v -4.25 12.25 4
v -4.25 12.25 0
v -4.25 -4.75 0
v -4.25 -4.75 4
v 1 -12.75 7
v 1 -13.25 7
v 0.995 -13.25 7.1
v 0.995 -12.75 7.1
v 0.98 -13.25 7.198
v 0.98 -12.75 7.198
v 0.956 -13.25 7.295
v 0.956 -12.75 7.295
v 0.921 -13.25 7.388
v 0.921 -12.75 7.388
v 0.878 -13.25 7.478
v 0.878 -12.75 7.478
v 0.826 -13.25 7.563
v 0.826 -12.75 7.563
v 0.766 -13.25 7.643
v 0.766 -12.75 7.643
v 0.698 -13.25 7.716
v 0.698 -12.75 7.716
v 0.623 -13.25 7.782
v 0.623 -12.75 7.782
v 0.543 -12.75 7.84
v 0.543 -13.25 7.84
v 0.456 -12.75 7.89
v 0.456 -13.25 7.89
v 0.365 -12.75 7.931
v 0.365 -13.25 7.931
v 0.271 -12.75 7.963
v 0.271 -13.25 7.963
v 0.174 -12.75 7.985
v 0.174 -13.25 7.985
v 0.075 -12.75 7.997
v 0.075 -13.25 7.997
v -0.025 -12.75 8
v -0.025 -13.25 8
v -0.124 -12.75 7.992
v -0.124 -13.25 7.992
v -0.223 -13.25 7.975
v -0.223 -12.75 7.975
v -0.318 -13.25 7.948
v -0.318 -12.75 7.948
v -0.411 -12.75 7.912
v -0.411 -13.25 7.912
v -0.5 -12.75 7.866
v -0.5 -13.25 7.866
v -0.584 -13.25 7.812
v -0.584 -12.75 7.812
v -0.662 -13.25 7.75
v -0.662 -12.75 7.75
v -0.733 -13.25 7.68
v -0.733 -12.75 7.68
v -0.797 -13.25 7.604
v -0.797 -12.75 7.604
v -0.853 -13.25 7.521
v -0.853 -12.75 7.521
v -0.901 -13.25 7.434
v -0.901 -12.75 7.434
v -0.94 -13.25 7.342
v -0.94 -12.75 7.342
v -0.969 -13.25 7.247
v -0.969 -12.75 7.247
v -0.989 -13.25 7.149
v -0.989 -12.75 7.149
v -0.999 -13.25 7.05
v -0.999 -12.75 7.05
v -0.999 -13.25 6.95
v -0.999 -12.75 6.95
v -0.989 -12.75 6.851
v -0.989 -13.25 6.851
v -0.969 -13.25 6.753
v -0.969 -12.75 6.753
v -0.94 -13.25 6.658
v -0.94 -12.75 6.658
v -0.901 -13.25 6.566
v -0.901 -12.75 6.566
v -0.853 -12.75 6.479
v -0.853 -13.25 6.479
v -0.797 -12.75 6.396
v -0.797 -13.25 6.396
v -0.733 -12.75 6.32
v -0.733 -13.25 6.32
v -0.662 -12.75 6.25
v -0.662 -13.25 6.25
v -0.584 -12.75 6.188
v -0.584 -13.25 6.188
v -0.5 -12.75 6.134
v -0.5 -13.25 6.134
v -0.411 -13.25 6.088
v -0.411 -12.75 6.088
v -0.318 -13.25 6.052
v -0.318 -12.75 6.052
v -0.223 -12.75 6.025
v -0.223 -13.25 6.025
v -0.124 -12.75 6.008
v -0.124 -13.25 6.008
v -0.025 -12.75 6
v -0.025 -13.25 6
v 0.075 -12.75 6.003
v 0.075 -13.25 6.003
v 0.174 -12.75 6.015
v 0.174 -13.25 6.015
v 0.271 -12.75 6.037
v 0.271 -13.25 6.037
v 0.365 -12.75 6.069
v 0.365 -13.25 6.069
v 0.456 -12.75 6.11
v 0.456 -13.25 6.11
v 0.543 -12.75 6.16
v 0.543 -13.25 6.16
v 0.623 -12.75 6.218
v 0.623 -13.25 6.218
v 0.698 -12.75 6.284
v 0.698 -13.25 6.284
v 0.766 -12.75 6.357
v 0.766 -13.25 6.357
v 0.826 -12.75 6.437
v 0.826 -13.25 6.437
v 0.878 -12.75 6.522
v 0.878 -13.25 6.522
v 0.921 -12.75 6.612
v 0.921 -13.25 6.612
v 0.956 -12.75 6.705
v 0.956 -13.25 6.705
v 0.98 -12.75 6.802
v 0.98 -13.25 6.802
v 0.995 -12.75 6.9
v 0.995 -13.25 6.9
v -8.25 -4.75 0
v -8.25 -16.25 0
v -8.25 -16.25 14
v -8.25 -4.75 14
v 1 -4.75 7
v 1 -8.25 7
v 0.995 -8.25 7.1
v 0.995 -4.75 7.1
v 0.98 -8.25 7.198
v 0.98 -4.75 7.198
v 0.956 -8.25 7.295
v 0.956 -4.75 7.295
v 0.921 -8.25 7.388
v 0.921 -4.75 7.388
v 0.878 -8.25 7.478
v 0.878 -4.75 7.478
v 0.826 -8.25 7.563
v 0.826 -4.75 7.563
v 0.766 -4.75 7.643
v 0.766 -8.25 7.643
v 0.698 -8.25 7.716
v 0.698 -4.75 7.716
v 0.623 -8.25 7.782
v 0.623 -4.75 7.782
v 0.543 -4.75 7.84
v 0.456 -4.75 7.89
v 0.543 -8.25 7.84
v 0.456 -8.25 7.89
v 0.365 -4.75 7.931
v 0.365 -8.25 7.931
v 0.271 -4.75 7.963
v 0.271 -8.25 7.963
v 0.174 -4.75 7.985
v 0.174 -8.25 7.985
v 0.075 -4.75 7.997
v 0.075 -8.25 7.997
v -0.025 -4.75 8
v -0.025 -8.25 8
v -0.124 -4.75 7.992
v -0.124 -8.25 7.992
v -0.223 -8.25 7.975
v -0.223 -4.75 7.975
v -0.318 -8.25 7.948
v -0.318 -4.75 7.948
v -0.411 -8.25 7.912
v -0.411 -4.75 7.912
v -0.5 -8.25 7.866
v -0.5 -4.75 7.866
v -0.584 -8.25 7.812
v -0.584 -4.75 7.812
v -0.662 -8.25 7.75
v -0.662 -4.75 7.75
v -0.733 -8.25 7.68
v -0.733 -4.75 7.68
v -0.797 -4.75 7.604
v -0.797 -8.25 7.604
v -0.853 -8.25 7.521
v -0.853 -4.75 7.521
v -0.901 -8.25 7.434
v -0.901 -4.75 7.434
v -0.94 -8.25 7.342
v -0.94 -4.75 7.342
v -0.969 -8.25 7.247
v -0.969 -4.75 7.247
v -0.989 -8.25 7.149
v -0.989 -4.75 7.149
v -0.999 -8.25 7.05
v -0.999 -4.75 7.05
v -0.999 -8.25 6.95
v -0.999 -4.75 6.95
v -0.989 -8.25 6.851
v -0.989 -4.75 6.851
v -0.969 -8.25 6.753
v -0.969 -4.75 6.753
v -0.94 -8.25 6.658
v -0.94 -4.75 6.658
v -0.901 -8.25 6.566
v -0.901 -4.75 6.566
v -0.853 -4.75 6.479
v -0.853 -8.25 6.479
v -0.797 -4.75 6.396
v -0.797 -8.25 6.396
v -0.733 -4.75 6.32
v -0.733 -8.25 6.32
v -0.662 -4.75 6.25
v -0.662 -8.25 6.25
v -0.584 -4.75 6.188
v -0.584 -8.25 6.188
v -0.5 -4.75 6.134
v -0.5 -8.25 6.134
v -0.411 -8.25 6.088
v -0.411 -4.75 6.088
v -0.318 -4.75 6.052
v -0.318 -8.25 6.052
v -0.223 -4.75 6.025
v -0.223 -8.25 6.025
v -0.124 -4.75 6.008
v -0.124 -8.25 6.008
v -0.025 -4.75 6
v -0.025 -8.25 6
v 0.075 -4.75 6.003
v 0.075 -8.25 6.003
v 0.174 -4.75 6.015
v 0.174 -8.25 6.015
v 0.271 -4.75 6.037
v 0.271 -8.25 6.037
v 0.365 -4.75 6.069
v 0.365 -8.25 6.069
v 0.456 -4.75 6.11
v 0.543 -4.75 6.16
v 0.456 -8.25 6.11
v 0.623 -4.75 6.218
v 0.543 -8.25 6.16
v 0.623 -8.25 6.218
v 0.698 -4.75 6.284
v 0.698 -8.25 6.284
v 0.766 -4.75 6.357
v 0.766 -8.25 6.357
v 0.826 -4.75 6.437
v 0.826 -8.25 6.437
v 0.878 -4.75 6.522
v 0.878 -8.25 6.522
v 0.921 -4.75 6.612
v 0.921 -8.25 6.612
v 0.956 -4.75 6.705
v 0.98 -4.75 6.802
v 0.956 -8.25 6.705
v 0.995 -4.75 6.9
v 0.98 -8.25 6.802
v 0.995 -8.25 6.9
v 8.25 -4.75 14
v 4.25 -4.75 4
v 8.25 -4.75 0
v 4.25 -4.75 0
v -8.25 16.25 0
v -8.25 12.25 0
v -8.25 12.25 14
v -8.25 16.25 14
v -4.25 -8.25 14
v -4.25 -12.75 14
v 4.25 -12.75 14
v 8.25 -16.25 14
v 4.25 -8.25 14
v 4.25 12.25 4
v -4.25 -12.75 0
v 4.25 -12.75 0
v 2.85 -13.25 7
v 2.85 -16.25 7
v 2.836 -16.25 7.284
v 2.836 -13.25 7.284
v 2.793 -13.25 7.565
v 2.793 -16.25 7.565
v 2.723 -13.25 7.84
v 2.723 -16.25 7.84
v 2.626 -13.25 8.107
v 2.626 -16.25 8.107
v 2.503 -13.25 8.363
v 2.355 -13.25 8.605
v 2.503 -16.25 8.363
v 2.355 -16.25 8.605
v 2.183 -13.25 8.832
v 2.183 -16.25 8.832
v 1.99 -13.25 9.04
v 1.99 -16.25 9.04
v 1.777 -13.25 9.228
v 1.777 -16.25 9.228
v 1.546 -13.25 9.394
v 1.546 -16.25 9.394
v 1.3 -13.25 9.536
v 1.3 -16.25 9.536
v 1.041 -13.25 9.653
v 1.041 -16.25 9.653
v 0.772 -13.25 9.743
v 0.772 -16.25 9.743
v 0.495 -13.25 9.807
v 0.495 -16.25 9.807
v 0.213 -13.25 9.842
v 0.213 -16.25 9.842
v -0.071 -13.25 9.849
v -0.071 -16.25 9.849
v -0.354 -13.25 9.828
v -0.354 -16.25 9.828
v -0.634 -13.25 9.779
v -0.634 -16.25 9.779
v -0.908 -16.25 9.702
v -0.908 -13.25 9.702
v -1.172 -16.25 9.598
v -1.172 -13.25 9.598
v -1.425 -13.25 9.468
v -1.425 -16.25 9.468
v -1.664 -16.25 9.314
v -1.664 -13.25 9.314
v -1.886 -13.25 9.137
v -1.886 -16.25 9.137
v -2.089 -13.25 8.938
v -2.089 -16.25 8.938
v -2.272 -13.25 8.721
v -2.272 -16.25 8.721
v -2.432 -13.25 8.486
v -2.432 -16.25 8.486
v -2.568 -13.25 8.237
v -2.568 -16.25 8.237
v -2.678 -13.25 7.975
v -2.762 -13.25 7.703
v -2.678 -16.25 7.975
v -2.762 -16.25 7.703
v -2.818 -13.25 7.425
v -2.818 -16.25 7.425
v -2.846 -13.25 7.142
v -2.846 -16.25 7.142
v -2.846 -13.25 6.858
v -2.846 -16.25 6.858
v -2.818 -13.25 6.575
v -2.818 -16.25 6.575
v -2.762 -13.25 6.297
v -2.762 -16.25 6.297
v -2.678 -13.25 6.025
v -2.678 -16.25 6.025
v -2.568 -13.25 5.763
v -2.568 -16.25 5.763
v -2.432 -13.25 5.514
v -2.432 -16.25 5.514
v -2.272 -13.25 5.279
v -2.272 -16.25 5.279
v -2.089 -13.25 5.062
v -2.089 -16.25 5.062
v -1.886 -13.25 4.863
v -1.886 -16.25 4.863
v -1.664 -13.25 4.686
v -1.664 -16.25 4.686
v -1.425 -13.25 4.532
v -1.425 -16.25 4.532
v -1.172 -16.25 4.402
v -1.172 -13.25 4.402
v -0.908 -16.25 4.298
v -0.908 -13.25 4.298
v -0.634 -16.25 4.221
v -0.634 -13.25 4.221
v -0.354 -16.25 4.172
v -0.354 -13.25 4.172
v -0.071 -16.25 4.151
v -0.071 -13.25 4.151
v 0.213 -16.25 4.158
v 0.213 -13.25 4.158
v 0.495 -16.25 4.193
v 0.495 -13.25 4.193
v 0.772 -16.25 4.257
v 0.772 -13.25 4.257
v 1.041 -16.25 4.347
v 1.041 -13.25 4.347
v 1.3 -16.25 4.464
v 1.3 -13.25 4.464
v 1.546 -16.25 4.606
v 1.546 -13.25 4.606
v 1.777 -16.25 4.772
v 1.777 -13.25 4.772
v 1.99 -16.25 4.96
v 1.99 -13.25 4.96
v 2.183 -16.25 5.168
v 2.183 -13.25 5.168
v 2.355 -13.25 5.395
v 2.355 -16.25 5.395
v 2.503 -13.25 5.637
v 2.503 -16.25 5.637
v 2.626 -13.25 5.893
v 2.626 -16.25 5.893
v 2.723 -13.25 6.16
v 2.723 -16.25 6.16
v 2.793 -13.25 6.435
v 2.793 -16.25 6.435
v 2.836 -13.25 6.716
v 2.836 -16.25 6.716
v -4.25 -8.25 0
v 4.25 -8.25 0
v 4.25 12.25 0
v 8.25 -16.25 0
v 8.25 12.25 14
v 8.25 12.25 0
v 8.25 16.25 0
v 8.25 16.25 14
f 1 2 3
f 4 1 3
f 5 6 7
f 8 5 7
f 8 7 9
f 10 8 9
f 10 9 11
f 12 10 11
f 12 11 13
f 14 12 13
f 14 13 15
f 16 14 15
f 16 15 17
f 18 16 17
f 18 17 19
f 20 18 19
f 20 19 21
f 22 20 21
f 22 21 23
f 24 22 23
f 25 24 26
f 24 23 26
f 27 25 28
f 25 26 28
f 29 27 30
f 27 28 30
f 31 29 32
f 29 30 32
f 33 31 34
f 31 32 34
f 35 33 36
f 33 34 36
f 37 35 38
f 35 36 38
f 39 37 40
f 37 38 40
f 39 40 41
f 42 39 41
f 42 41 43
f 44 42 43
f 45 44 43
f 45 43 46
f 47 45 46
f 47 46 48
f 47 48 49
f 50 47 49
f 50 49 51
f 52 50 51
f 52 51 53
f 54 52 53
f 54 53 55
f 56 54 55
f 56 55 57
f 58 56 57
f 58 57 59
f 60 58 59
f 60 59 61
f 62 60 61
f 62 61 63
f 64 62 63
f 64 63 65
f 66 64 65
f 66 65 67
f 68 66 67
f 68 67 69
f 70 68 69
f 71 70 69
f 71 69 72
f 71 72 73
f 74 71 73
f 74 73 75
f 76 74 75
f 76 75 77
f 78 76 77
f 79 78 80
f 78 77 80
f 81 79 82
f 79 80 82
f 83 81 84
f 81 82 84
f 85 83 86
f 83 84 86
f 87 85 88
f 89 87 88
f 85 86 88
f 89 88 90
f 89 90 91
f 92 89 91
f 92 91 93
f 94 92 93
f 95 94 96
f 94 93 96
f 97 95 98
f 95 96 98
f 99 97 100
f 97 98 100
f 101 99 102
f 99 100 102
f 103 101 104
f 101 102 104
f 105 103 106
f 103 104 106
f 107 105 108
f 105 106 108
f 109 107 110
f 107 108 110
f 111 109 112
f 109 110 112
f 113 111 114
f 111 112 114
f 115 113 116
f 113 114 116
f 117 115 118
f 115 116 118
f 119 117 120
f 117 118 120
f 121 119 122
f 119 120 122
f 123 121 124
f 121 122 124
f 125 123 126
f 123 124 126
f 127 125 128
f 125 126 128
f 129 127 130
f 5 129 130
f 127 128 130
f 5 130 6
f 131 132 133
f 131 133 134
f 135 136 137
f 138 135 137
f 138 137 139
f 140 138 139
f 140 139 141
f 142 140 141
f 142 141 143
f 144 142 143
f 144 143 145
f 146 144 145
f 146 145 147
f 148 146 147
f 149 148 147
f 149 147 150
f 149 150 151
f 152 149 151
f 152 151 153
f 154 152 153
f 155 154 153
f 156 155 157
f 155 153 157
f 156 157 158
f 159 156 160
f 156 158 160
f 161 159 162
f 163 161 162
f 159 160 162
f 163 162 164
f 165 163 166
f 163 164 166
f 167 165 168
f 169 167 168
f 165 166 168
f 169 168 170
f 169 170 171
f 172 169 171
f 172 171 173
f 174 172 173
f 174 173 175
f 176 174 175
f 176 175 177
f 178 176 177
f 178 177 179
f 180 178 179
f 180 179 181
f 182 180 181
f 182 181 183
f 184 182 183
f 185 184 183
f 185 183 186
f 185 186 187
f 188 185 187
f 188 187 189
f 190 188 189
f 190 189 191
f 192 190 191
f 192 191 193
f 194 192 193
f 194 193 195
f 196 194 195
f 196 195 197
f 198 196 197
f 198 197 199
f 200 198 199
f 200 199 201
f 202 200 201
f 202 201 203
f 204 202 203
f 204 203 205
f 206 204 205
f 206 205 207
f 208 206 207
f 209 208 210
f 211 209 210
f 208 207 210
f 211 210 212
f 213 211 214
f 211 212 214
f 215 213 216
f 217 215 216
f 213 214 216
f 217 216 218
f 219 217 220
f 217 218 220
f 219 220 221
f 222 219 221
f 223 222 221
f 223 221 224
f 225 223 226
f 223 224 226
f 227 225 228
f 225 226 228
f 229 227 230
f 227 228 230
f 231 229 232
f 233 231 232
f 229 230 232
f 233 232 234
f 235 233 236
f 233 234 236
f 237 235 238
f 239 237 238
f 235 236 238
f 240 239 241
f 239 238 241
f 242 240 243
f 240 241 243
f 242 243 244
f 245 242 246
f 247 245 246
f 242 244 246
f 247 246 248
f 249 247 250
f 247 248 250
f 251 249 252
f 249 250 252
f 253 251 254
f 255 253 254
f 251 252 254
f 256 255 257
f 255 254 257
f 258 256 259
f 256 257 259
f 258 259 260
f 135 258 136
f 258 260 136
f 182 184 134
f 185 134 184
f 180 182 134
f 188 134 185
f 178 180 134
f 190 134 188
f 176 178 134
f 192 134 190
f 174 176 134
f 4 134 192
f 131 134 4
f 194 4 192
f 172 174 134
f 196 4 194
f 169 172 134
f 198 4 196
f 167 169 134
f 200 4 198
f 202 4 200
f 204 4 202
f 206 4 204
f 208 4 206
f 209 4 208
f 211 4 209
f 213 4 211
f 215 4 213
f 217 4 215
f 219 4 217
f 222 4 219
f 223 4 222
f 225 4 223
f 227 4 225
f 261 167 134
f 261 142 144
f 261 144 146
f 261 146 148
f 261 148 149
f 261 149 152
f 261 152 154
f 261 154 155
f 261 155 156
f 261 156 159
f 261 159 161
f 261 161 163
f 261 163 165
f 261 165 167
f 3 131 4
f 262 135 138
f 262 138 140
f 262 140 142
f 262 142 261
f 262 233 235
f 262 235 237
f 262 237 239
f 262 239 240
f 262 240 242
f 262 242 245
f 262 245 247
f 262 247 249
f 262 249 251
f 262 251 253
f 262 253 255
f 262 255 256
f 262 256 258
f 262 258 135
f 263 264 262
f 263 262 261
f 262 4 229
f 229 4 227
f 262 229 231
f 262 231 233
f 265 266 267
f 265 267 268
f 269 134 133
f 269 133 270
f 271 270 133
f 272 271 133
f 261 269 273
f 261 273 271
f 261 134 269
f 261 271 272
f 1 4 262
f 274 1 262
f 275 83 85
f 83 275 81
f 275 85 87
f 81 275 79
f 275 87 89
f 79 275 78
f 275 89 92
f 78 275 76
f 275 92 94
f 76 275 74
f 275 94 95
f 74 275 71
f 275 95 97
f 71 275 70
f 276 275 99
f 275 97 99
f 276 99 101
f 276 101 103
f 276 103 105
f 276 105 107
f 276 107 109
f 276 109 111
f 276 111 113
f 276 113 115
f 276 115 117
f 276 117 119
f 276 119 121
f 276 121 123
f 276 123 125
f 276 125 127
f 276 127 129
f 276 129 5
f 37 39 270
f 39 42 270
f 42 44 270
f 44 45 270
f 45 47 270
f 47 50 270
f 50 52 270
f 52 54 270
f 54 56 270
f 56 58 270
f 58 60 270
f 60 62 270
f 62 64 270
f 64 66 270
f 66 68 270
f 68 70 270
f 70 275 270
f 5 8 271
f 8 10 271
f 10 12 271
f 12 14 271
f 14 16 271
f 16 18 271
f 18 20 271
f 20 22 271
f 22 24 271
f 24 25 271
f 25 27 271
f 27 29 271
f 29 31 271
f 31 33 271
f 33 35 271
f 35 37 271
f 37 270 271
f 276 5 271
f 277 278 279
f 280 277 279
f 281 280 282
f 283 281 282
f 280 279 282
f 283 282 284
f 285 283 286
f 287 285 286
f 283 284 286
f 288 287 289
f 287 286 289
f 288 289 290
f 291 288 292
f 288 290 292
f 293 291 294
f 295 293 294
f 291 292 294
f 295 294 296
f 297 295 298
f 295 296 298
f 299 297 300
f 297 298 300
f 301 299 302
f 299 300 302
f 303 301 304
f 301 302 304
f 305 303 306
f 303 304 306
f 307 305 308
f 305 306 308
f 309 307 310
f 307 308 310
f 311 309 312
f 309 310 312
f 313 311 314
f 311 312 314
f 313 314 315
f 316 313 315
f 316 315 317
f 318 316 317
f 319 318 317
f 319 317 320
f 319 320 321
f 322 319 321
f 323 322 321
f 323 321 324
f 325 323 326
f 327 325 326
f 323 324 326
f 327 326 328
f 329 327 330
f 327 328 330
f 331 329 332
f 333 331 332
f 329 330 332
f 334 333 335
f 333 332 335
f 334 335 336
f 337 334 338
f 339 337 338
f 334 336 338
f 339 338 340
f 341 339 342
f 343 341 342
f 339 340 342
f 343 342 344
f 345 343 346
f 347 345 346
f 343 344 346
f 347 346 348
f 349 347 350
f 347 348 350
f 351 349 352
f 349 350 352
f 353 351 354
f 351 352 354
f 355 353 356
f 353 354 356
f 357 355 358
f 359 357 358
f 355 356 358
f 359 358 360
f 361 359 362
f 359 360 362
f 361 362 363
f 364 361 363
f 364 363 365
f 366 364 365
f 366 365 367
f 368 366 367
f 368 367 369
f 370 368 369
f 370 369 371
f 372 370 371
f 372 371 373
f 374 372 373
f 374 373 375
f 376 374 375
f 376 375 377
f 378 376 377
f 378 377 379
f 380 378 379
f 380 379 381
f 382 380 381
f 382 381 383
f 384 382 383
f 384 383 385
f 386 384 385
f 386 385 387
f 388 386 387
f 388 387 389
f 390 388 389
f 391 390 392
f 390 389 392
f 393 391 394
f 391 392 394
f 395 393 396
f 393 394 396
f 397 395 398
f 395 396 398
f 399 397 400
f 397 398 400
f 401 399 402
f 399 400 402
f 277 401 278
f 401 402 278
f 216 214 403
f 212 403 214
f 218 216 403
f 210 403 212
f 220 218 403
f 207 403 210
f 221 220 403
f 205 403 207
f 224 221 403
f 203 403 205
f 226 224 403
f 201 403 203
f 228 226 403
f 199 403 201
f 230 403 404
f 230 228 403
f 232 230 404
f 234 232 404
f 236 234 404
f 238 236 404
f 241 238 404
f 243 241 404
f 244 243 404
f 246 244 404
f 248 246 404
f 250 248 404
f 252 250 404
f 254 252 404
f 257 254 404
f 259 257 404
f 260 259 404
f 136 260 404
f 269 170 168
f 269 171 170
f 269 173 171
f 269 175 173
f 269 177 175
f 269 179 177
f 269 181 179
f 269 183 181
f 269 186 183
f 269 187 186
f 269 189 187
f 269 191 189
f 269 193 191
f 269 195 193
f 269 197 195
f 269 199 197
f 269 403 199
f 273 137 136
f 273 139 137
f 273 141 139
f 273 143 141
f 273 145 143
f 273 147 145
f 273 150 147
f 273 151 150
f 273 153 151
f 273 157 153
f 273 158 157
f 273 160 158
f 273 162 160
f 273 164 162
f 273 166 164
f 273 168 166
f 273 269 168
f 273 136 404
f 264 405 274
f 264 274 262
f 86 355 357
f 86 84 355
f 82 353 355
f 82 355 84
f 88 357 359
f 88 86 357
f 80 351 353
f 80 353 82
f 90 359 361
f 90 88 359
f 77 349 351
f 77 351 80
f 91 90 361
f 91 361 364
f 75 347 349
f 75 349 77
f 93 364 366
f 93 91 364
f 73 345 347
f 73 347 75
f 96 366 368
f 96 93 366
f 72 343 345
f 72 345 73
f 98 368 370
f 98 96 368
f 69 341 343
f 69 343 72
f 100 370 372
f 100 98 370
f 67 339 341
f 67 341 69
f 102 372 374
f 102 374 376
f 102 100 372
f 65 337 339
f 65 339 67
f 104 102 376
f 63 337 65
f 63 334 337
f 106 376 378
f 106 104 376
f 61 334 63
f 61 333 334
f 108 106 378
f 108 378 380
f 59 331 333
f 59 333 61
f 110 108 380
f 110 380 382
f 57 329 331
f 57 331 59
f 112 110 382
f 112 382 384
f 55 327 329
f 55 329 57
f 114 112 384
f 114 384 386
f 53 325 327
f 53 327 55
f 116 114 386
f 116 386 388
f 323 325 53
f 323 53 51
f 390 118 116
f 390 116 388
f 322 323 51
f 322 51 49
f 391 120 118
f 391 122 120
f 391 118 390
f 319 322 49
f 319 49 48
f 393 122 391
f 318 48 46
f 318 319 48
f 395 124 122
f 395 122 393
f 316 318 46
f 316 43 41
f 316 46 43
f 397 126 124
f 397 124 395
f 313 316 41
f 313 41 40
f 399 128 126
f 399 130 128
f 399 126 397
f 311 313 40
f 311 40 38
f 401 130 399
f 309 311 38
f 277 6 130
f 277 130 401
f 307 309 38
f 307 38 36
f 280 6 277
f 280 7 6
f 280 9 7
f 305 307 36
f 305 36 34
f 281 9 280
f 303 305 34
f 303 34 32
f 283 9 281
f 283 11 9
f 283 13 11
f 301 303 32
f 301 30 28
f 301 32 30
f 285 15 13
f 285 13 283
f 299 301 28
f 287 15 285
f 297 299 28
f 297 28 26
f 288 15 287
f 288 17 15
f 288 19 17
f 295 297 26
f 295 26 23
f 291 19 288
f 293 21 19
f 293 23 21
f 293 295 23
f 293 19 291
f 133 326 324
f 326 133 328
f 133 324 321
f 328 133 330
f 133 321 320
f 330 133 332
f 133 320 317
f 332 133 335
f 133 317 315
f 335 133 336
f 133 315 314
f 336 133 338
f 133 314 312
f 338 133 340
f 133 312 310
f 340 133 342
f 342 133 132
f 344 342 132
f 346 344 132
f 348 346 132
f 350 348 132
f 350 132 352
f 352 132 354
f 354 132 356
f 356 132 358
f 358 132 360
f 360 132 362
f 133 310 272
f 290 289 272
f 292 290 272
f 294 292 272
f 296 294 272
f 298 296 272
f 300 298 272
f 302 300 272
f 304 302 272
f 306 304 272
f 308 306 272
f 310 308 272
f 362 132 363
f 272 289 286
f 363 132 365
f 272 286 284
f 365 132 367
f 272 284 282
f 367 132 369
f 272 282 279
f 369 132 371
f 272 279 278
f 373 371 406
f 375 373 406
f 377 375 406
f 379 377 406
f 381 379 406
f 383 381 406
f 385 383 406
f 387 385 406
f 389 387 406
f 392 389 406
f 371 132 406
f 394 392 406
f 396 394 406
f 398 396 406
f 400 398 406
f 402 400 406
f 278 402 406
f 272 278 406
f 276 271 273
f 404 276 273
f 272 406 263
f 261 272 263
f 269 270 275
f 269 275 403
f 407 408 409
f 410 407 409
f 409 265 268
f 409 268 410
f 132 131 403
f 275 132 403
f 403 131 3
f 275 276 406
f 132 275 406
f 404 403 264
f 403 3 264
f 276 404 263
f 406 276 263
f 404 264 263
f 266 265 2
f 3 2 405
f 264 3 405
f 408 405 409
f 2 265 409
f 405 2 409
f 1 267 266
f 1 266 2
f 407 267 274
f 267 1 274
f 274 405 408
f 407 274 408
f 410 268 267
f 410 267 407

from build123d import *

# Parameters (mm, degrees)
F0_W      = 16.5
F0_H      = 32.5
F1_DEPTH  = 14
F3_W      = 16.5
F3_H      = 17
F4_DEPTH  = 10
F5_W      = 4
F5_H      = 17
F6_DEPTH  = 14.001
F7_W      = 8.5
F7_H      = 4.5
F8_DEPTH  = 14.001
F9_R      = 2.85
F10_DEPTH = 3
F11_R     = 1
F12_DEPTH = 10


with BuildPart() as f1:
    # F0 (on Top) → F1 (new body)
    with BuildSketch(Plane.XY):
        Rectangle(F0_W, F0_H)
    extrude(amount=F1_DEPTH)

    # F3 (on face) → F4 (cut)
    with BuildSketch(Plane.XY.offset(14)):
        with Locations((0, 3.75)):
            Rectangle(F3_W, F3_H)
    extrude(amount=-F4_DEPTH, mode=Mode.SUBTRACT)

    # F5 (on face) → F6 (cut, through all)
    with BuildSketch(Plane(origin=(0, 0, 0), x_dir=(1, 0, 0), z_dir=(0, 0, -1))):
        with Locations((-6.25, -3.75)):
            Rectangle(F5_W, F5_H)
        with Locations((6.25, -3.75)):
            Rectangle(F5_W, F5_H)
    extrude(amount=-F6_DEPTH, mode=Mode.SUBTRACT)

    # F7 (on face) → F8 (cut, through all)
    with BuildSketch(Plane.XY.offset(14)):
        with Locations((0, -10.5)):
            Rectangle(F7_W, F7_H)
    extrude(amount=-F8_DEPTH, mode=Mode.SUBTRACT)

    # F9 (on face) → F10 (cut)
    with BuildSketch(Plane.XZ.offset(16.25)):
        with Locations((0, 7)):
            Circle(F9_R)
    extrude(amount=-F10_DEPTH, mode=Mode.SUBTRACT)

    # F11 (on face) → F12 (cut)
    with BuildSketch(Plane.XZ.offset(13.25)):
        with Locations((0, 7)):
            Circle(F11_R)
    extrude(amount=-F12_DEPTH, mode=Mode.SUBTRACT)


solid = f1.part
